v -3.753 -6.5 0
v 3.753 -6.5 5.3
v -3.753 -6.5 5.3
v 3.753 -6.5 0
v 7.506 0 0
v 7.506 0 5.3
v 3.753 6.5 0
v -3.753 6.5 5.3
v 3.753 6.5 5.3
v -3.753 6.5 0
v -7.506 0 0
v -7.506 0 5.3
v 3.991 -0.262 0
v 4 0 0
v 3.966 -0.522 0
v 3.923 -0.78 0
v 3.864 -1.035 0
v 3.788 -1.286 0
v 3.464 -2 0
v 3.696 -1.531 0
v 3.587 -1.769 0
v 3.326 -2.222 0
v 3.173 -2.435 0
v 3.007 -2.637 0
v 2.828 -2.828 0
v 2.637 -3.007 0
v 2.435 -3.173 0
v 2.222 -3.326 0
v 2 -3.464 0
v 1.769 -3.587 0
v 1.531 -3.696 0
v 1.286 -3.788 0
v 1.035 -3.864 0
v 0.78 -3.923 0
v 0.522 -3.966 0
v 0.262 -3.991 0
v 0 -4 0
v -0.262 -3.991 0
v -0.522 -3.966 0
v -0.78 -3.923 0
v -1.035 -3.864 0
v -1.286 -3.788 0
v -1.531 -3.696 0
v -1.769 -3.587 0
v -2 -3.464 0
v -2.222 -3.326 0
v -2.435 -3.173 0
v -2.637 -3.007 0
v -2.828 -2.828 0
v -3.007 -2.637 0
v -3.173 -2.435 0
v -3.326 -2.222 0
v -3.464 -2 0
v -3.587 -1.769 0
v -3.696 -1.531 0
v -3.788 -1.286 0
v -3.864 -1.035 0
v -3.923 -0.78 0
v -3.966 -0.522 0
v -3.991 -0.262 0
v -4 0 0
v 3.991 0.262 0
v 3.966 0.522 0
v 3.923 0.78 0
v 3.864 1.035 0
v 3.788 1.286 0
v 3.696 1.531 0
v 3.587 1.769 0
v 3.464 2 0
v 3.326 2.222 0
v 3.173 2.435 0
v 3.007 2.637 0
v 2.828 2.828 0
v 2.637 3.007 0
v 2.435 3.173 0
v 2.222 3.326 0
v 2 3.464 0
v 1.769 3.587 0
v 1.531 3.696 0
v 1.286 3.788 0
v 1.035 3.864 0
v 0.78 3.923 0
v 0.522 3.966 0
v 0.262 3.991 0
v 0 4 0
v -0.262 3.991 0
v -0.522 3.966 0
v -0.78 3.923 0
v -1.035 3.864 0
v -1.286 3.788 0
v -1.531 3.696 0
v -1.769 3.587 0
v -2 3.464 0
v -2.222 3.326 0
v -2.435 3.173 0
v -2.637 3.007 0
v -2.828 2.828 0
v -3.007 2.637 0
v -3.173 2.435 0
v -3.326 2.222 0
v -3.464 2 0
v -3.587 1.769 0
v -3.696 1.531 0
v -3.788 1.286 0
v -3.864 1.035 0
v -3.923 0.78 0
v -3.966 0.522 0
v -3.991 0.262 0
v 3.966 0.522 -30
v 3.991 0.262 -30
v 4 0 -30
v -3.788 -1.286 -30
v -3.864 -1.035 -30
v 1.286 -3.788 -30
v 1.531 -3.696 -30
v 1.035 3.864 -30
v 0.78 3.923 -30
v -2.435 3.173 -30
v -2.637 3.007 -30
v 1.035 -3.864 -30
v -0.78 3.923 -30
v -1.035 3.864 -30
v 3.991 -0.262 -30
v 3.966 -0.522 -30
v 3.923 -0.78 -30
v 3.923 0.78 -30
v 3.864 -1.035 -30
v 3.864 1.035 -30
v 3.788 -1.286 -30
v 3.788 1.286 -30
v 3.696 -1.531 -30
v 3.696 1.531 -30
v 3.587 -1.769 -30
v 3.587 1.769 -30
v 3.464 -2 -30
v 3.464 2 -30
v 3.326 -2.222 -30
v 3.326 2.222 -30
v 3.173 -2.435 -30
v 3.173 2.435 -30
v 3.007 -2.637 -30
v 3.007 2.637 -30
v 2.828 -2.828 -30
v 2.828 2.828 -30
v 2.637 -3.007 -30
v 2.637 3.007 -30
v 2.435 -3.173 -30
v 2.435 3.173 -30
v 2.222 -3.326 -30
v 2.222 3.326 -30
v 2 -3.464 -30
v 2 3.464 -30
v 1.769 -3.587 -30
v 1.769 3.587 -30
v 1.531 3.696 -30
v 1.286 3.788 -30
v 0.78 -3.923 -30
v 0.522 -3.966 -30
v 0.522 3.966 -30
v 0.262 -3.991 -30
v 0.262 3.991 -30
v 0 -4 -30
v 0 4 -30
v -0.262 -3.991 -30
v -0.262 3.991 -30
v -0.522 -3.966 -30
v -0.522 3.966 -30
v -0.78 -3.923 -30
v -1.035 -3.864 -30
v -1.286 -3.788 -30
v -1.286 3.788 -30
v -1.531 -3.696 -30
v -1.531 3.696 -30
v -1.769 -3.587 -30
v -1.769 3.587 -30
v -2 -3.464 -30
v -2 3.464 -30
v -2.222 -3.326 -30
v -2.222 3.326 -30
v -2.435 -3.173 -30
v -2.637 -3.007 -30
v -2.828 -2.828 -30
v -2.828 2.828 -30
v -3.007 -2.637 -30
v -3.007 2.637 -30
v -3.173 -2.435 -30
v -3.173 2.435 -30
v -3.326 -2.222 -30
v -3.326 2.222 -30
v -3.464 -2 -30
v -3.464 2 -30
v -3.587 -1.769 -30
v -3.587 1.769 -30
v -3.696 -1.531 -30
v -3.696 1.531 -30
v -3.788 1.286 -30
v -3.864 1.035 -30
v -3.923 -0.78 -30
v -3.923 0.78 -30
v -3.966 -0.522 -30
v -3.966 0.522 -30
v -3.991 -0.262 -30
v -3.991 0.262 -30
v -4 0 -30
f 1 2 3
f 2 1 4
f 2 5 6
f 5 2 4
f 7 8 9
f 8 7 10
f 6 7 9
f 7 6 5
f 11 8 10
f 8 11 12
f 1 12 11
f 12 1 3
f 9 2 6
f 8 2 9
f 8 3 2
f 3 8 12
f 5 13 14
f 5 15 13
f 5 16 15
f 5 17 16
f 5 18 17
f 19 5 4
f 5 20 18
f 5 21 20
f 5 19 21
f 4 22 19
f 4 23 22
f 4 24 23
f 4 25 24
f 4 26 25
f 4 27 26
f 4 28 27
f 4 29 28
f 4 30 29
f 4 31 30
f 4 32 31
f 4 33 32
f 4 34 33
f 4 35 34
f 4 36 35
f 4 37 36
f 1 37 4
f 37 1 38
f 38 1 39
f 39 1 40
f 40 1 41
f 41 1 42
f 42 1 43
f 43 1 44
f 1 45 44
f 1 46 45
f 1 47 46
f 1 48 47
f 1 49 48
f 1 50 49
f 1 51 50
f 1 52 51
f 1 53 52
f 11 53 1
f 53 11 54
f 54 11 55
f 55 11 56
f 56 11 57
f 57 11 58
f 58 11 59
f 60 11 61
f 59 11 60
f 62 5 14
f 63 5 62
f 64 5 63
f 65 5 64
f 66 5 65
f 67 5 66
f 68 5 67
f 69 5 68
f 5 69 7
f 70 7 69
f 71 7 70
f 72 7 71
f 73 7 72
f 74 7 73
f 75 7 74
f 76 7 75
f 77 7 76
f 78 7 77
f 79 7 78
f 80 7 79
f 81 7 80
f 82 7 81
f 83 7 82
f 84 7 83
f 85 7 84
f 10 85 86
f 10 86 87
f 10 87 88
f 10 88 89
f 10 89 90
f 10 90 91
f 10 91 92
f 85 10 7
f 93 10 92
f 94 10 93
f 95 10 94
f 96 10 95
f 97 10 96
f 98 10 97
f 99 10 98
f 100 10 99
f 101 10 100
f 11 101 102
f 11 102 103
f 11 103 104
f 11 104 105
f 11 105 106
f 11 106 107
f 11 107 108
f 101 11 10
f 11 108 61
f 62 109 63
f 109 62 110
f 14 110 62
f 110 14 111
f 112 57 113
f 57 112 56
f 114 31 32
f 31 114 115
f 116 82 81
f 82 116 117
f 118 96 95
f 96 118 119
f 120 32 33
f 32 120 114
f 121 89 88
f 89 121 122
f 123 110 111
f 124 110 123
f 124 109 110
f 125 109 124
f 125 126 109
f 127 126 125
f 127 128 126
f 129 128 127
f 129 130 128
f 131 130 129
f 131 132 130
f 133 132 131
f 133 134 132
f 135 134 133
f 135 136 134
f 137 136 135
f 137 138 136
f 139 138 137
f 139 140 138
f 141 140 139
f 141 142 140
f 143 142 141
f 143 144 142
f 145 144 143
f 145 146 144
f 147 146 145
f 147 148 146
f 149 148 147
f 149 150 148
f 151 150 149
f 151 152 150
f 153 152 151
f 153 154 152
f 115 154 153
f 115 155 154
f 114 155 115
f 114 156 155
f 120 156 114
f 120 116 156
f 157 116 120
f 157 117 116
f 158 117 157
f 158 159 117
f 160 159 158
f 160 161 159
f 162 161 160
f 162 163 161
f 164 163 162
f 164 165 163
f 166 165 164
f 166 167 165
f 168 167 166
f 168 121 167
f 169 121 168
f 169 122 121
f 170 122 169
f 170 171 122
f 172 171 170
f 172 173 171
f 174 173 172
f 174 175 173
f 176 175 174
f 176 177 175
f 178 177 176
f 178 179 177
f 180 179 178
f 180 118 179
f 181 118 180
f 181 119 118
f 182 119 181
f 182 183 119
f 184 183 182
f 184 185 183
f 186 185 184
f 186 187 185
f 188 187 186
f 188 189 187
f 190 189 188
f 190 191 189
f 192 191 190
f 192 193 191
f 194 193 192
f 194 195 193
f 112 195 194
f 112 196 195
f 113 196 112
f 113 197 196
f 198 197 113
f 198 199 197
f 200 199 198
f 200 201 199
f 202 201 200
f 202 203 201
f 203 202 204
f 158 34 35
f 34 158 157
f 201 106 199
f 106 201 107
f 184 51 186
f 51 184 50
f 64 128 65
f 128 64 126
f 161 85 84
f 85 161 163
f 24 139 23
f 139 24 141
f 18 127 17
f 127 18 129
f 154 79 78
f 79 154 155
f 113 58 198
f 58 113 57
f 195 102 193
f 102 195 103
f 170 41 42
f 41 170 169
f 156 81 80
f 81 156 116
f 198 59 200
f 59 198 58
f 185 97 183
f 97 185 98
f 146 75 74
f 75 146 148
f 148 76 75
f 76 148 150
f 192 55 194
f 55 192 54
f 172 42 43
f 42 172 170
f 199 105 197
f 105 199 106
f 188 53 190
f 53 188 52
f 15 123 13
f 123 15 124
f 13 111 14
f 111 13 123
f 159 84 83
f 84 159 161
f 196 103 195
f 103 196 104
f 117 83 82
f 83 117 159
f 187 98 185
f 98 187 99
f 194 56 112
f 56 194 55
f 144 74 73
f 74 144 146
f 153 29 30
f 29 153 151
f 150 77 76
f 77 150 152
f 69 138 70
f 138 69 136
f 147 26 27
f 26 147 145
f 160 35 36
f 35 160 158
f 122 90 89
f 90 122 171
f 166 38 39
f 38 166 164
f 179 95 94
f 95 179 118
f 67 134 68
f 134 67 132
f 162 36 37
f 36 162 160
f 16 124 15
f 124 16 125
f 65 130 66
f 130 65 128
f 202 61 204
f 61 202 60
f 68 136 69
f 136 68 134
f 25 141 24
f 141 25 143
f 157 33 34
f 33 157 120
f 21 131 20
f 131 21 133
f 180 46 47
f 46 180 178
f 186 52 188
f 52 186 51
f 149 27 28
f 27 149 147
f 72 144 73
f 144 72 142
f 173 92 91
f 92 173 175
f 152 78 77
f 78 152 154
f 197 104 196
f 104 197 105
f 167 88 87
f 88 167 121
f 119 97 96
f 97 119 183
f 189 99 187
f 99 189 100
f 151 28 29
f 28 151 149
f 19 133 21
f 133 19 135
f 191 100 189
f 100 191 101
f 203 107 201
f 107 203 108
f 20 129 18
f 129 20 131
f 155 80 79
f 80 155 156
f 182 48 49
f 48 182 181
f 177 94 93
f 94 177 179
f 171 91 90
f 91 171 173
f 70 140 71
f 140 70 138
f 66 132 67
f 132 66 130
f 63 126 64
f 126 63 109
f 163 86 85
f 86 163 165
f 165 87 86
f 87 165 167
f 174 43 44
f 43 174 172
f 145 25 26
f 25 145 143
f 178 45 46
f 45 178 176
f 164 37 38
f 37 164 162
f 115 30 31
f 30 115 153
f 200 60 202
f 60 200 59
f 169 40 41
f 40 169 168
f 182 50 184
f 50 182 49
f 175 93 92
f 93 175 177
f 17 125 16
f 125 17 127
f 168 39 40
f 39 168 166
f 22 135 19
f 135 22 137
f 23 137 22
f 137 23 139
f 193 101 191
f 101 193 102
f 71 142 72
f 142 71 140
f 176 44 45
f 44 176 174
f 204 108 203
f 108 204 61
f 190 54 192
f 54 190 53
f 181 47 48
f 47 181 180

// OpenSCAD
head_af = 13;
head_height = 5.3;
shank_diameter = 8;
shank_length = 30;

union() {
    cylinder(
        h = head_height,
        r = head_af / (2 * cos(30)),
        center = false,
        $fn = 6
    );

    translate([0, 0, -shank_length])
        cylinder(
            h = shank_length,
            d = shank_diameter,
            center = false,
            $fn = 96
        );
}
